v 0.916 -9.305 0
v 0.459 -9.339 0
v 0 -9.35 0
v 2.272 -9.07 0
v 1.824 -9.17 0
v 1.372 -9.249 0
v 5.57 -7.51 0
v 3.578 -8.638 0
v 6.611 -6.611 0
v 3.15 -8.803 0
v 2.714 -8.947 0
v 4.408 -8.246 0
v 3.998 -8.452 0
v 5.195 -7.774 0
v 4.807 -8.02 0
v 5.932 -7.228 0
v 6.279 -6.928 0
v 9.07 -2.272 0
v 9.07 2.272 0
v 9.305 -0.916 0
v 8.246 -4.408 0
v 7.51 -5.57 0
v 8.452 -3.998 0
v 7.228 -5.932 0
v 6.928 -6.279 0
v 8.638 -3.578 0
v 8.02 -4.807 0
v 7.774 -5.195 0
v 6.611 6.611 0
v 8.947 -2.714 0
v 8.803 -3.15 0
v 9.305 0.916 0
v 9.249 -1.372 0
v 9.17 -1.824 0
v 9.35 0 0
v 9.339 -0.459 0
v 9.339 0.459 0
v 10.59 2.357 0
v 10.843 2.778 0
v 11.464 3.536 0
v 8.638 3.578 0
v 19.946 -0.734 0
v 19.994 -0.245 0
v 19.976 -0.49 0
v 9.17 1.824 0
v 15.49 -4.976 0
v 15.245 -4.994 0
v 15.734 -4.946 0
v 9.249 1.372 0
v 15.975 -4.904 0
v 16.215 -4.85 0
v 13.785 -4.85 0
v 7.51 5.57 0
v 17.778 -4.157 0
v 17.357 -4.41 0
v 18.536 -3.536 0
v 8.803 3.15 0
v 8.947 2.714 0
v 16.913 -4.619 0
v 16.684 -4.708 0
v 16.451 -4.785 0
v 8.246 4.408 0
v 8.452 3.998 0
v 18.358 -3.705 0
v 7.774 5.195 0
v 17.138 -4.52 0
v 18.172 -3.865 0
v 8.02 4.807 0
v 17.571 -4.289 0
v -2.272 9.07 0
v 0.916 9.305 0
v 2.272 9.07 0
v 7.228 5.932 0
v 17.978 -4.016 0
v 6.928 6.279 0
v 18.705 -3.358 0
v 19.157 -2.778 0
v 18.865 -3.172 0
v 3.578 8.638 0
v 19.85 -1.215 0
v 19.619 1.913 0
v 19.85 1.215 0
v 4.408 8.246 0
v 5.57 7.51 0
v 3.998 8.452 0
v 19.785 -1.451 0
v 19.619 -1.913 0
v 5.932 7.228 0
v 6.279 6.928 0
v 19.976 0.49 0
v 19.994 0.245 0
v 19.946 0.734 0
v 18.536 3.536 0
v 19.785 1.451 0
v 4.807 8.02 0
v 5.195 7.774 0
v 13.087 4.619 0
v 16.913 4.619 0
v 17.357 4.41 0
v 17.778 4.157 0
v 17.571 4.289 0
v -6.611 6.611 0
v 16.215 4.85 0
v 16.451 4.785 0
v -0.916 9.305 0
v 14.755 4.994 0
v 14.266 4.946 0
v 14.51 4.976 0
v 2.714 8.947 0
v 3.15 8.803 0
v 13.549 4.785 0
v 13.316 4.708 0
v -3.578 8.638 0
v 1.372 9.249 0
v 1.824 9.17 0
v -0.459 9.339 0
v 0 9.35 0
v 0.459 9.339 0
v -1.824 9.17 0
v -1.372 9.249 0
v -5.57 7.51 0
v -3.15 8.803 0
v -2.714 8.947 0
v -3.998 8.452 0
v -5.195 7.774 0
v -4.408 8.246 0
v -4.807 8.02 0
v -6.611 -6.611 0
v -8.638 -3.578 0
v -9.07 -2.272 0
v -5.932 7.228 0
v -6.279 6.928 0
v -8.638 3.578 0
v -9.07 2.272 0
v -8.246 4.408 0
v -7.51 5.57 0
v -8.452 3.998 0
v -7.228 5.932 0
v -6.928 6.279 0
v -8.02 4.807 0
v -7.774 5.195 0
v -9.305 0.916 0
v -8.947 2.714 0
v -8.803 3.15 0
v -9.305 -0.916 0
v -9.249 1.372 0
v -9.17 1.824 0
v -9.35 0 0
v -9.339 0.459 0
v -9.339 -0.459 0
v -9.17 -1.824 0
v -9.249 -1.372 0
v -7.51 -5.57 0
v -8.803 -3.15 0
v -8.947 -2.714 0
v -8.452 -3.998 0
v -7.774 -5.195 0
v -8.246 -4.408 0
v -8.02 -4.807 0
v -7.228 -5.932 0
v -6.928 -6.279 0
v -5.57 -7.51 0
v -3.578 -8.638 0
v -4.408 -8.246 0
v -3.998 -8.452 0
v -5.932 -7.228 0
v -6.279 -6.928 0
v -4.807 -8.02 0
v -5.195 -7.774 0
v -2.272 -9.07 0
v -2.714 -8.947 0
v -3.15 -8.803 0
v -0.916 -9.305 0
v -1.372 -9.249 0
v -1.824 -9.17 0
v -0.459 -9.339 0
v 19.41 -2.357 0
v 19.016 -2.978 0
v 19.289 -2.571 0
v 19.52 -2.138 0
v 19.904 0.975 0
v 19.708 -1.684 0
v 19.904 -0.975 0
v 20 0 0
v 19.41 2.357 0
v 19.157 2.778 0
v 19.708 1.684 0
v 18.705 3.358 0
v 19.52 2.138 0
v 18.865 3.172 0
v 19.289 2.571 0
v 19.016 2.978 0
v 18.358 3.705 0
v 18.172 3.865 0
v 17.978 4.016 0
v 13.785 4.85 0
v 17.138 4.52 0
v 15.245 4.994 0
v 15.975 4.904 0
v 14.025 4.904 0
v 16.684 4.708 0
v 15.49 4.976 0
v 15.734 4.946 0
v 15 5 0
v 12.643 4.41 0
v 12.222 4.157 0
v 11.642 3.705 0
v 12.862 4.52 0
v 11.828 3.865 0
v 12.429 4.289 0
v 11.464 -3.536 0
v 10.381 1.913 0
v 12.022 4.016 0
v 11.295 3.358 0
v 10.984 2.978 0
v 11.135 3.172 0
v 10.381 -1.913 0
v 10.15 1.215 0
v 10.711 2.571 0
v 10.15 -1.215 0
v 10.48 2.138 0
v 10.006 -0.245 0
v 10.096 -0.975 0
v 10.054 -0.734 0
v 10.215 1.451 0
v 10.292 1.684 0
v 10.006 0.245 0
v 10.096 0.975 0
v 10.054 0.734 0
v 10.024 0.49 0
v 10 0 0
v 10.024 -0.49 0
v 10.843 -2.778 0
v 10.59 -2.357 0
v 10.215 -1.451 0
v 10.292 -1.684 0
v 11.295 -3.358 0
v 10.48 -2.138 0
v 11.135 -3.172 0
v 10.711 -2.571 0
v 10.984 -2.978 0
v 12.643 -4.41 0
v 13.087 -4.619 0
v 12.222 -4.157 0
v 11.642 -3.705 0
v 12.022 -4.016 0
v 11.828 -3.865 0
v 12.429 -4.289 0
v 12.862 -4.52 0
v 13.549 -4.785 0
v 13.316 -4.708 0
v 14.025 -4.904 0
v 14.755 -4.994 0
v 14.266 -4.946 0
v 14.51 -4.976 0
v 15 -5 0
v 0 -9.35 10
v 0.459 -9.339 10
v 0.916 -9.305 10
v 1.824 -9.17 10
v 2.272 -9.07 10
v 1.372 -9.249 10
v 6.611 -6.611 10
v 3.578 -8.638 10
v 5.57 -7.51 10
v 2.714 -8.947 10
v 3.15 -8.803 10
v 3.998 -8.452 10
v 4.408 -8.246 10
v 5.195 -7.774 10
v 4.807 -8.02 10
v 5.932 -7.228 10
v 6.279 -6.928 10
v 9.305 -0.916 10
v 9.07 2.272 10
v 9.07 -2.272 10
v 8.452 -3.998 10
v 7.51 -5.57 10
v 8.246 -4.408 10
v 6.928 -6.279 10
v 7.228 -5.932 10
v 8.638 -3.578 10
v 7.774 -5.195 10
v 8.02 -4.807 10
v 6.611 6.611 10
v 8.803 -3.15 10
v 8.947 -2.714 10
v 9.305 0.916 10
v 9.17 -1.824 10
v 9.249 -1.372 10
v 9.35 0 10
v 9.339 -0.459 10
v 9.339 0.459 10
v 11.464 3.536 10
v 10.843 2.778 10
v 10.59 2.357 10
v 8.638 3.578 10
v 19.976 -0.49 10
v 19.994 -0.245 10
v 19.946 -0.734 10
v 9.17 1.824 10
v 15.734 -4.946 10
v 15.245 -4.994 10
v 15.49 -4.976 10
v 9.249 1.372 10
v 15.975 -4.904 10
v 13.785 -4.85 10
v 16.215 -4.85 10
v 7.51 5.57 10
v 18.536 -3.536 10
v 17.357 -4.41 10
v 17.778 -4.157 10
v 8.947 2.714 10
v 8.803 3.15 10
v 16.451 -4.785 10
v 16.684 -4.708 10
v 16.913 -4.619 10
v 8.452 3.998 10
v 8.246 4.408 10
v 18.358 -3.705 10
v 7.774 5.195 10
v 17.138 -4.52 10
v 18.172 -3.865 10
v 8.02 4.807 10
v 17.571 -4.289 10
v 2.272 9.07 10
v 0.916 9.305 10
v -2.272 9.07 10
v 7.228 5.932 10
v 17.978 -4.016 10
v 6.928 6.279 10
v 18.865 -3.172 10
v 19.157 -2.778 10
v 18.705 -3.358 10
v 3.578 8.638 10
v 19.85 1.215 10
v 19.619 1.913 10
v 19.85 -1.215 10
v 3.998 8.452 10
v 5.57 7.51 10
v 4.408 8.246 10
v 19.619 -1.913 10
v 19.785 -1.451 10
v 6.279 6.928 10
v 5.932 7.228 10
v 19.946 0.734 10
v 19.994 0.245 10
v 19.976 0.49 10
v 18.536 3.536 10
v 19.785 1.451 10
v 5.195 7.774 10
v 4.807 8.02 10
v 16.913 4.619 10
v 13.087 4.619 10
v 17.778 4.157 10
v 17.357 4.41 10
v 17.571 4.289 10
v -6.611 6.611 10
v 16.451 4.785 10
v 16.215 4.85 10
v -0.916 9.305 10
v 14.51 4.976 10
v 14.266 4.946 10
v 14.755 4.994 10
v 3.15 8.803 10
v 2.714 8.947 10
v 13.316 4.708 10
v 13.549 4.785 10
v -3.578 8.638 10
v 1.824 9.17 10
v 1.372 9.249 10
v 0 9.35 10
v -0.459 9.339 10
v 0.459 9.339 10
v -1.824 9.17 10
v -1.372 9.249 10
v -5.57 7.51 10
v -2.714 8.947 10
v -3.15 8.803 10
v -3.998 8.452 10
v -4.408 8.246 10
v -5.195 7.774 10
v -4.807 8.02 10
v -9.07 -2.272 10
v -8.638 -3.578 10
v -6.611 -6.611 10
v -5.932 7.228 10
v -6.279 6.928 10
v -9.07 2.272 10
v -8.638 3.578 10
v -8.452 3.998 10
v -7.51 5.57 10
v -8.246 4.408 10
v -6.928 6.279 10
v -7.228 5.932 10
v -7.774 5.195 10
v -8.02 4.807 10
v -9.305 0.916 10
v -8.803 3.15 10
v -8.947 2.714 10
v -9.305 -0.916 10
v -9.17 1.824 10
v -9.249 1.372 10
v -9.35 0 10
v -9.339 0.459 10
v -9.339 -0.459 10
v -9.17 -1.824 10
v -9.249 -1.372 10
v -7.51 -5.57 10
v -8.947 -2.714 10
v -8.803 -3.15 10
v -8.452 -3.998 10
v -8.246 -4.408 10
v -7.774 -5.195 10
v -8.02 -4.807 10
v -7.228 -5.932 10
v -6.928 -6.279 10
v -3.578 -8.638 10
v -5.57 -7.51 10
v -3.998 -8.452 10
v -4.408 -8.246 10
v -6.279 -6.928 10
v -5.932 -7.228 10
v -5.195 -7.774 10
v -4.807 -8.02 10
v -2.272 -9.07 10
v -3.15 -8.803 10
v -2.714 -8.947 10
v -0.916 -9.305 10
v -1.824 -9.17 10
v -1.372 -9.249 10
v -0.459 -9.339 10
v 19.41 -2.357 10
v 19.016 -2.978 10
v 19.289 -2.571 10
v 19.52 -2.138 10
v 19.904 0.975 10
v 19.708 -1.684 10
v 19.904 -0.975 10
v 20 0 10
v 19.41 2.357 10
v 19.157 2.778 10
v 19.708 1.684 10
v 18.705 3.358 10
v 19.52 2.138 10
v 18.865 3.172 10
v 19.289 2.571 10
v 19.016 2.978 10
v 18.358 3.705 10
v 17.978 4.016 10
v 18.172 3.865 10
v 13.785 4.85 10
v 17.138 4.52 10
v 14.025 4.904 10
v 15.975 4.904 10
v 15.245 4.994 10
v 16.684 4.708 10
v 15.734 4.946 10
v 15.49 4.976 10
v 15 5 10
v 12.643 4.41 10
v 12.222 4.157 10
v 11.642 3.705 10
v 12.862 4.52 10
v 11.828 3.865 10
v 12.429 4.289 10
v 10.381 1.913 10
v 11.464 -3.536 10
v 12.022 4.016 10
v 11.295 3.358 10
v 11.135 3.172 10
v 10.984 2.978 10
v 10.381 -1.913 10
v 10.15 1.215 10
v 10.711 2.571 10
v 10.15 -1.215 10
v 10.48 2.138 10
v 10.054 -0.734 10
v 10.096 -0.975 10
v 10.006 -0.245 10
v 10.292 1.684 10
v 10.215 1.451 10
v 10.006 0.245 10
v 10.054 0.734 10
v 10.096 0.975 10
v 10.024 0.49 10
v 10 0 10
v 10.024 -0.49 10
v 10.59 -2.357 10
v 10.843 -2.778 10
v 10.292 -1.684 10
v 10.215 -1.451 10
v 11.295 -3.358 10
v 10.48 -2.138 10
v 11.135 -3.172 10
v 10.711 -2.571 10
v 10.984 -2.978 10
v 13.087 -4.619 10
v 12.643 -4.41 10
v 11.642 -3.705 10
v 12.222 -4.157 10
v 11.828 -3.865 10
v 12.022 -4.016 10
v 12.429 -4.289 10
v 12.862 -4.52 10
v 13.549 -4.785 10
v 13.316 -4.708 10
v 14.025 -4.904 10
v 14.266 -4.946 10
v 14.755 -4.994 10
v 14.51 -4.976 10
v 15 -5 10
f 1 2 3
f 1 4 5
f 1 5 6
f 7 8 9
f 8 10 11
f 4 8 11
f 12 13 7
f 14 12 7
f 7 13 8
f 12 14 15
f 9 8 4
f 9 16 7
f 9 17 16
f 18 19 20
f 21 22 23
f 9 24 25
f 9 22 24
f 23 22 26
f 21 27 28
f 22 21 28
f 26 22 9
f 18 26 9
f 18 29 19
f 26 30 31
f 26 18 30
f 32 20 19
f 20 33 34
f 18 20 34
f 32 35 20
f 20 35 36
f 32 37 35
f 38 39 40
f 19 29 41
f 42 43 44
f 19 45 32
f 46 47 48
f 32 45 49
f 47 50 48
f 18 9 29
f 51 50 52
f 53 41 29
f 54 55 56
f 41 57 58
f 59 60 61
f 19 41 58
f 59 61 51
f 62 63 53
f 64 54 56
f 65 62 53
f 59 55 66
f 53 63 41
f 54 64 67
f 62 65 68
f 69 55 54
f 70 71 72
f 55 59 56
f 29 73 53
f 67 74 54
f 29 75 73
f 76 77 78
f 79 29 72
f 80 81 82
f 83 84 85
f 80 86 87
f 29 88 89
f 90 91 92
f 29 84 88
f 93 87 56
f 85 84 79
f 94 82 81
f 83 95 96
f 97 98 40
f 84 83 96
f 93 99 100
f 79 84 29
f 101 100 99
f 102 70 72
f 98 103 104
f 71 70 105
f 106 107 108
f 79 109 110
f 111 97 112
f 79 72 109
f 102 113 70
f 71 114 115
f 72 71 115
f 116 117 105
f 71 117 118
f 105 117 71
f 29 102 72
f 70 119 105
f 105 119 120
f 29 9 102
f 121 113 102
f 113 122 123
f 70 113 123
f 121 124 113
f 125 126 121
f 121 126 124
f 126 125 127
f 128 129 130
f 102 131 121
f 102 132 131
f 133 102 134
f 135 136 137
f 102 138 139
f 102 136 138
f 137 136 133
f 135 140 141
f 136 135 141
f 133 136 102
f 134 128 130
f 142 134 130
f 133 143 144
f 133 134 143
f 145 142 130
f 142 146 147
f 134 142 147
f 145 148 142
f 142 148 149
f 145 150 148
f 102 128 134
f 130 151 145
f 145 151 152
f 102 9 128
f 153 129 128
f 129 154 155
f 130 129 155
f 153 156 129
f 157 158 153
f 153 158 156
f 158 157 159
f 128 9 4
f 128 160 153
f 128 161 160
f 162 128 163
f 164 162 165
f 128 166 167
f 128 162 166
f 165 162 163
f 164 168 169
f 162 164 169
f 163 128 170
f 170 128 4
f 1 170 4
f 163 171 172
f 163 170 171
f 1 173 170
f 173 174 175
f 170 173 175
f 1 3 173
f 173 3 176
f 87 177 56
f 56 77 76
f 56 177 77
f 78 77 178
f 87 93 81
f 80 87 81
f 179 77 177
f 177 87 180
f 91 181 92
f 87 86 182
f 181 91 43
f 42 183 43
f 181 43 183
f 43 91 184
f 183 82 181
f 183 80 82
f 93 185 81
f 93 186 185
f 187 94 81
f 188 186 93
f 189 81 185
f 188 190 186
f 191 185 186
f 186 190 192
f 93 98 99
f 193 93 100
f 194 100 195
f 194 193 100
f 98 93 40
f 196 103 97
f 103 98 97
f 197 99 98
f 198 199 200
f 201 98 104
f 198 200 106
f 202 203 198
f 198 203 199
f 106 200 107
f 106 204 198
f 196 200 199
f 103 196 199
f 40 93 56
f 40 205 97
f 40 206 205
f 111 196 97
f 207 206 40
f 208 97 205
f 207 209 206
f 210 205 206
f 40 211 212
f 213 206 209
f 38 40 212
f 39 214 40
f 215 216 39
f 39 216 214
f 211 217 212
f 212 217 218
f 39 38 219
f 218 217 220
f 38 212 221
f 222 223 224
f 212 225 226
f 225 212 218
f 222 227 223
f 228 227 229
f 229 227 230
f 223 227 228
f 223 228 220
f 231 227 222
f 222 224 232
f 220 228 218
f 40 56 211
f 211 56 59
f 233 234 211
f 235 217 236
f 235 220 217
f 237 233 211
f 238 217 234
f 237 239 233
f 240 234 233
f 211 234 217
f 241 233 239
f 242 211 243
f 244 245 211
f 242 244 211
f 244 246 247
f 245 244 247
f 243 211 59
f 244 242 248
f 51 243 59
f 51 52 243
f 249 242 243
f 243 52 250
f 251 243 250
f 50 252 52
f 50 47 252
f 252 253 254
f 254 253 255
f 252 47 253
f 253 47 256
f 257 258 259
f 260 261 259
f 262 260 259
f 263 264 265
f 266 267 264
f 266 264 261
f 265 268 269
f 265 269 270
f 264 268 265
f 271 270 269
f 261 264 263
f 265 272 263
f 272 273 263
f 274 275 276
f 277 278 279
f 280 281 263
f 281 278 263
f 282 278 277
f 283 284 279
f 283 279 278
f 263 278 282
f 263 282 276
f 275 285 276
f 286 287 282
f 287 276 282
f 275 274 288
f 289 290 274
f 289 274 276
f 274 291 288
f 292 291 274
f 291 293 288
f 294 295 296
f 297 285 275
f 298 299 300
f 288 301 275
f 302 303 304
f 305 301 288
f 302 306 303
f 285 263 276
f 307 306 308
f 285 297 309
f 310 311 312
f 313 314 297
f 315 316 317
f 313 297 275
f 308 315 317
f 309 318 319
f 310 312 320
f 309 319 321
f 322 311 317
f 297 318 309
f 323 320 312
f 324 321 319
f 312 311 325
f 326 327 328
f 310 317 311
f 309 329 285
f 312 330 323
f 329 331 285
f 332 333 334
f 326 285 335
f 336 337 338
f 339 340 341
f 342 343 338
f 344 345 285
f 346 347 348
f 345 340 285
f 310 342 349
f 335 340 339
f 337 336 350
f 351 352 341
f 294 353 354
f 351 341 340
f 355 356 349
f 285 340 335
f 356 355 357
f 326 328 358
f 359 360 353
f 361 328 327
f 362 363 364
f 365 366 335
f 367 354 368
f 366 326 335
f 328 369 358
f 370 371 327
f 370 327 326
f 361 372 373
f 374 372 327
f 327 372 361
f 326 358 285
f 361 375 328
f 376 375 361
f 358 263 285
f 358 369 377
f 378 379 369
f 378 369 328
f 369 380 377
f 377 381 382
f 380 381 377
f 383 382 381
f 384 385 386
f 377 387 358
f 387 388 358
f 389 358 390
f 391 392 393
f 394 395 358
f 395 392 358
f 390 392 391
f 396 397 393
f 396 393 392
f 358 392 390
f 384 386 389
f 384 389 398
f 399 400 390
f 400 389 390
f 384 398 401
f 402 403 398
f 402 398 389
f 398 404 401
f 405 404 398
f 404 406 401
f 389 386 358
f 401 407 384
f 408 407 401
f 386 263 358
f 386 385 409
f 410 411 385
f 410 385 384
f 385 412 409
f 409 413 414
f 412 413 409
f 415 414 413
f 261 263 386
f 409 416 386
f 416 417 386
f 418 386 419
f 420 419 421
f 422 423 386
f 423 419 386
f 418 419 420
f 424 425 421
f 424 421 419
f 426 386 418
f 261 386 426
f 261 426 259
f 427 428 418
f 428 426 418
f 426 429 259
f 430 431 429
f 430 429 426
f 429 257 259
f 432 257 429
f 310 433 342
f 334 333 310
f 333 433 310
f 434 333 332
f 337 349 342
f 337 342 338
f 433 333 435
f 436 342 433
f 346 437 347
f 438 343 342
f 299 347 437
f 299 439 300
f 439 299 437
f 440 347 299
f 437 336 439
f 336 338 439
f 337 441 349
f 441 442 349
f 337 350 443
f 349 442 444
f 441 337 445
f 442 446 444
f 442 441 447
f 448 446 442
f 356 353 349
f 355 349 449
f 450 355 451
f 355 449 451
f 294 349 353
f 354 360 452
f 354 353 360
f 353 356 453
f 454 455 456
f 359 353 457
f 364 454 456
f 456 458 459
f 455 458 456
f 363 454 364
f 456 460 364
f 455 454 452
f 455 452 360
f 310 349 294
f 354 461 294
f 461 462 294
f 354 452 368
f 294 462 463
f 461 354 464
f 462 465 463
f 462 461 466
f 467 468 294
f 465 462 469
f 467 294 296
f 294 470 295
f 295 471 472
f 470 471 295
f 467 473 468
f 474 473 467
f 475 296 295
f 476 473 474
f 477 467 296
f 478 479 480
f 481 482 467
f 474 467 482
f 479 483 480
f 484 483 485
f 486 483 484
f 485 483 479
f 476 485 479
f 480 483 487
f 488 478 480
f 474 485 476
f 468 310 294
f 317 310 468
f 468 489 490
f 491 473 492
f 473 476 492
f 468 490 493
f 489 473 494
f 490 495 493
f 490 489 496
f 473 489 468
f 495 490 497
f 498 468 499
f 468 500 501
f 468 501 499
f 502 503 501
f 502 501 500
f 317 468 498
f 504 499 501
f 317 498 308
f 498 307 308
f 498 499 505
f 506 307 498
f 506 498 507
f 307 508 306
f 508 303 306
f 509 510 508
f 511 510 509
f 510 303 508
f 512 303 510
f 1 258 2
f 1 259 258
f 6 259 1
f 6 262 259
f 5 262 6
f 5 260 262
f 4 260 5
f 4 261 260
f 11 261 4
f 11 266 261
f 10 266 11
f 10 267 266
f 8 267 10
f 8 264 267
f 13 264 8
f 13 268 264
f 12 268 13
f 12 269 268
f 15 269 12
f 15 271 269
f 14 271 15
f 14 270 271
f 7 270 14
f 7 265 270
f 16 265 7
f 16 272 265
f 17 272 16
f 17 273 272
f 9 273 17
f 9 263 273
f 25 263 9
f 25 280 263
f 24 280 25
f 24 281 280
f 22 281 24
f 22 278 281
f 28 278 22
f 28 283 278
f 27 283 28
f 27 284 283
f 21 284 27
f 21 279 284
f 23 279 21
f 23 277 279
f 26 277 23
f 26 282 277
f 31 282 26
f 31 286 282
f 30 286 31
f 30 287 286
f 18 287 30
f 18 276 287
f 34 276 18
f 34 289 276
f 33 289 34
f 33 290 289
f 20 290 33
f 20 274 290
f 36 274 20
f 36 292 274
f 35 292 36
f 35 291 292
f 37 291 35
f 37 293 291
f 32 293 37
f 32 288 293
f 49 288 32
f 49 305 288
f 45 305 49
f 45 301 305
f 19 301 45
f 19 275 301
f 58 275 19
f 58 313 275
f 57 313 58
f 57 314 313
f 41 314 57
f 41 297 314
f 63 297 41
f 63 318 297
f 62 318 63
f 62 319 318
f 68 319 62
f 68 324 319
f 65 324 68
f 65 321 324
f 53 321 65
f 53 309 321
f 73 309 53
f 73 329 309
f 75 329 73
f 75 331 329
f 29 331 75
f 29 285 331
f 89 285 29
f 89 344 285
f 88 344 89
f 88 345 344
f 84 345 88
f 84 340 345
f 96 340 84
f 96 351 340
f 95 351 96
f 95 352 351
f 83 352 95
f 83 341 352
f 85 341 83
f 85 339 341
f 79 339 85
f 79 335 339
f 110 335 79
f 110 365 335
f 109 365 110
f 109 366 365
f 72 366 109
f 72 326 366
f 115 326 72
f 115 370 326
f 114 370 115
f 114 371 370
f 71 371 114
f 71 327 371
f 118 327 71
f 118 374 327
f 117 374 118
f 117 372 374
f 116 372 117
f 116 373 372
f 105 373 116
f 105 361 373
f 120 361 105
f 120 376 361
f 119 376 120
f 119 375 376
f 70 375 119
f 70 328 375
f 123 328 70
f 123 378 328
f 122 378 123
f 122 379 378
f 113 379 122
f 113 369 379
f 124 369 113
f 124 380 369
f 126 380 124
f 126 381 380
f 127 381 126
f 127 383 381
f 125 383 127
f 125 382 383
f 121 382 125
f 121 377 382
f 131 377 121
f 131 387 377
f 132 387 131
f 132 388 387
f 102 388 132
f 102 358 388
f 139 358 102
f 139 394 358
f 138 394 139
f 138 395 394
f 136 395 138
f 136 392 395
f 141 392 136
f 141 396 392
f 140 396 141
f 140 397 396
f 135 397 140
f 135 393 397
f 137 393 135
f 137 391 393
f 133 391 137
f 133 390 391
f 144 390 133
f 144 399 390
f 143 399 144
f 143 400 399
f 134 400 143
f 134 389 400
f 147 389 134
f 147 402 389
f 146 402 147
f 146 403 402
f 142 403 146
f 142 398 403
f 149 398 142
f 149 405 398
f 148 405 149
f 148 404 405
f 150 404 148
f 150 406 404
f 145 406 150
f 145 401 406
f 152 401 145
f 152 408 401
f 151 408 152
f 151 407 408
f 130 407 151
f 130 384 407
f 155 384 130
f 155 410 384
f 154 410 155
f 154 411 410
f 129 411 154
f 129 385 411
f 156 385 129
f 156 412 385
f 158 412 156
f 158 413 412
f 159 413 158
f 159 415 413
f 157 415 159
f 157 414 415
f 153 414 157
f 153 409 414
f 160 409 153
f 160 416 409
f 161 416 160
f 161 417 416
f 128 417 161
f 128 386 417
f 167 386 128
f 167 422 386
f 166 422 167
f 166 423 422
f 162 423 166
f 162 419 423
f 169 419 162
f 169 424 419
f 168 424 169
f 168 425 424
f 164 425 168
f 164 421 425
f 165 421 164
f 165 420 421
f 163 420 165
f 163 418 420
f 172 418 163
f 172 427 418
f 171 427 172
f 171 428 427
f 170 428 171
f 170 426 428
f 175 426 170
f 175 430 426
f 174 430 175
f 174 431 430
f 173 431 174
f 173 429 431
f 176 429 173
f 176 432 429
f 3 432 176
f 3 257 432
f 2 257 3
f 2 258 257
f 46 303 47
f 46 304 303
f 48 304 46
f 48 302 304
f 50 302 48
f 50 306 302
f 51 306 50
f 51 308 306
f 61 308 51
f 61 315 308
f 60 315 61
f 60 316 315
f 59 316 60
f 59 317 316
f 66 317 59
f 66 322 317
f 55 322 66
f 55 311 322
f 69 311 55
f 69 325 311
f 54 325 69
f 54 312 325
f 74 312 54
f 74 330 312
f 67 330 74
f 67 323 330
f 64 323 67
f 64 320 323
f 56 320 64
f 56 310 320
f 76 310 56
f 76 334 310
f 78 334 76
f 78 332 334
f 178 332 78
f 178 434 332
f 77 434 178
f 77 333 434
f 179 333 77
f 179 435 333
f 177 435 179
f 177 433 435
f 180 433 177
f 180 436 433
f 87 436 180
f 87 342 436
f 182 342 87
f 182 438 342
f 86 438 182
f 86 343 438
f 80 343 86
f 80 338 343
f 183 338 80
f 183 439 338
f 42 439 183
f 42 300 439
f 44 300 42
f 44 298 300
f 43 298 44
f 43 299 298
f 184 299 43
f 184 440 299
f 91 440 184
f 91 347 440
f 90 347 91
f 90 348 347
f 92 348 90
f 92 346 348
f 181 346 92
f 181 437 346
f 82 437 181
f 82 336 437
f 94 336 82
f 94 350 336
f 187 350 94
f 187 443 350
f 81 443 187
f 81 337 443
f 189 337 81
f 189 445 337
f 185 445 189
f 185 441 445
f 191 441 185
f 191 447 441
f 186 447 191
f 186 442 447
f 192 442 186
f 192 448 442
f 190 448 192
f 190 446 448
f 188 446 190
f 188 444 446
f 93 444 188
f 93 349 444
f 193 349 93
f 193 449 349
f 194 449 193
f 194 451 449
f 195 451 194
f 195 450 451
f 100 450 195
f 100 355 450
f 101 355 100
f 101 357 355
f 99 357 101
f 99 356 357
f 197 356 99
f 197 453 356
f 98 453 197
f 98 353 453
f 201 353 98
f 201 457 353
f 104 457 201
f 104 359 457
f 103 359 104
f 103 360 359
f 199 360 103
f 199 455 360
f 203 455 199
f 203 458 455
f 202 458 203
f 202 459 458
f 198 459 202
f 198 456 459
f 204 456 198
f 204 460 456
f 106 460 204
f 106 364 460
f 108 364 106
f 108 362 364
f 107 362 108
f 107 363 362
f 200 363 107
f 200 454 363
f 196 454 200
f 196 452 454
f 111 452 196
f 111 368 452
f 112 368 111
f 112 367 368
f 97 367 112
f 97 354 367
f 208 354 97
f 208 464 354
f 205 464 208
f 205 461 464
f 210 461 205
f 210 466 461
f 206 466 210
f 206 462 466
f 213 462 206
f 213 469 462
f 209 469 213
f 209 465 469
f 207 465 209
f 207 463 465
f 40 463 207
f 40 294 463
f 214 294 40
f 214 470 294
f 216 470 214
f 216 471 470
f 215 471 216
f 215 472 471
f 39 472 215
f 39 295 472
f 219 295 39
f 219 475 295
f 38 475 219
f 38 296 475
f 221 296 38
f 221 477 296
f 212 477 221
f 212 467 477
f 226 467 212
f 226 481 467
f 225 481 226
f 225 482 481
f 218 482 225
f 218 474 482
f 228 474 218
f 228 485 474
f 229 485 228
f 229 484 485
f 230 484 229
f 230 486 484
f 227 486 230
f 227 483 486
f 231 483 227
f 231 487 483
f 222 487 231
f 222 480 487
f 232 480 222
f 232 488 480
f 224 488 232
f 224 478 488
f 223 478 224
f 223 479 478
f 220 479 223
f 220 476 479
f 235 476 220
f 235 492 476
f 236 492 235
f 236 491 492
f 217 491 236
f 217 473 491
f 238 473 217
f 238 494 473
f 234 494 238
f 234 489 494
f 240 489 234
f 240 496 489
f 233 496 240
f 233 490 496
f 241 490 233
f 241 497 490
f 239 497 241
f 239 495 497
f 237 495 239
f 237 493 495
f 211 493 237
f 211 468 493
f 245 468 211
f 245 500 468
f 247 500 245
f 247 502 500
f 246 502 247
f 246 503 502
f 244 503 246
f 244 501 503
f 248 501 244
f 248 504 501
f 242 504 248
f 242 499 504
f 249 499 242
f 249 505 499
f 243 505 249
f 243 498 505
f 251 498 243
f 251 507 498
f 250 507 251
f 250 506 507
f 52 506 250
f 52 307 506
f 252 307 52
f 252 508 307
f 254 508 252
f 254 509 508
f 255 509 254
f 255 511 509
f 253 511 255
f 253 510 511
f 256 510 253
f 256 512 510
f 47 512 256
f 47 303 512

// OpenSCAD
// Snap-on tubing clip for a 12.7 mm (1/2 inch) lab stand rod
// Printed flat: 2-D profile in XY, extruded 10 mm in Z

// ---------------- Parameters ----------------
rod_id      = 12.7;   // rod ring inner diameter
rod_wall    = 3;      // rod ring wall thickness
rod_od      = rod_id + 2 * rod_wall; // rod ring outer diameter (18.7)
rod_opening = 10;     // rod ring opening width (along Y)

tub_id      = 6;      // tubing ring inner diameter
tub_wall    = 2;      // tubing ring wall thickness
tub_od      = tub_id + 2 * tub_wall; // tubing ring outer diameter (10)
tub_x       = 15;     // tubing ring centre X
tub_opening = 4.5;    // tubing ring opening width (along Y)

bridge_w    = 6;      // bridge width (along Y)
bridge_x1   = 8;      // bridge start X
bridge_x2   = 12;     // bridge end X

eps         = 0.5;    // cutter overshoot past faces
$fn         = 128;    // curve resolution

// ---------------- Profile ----------------
module profile() {
    union() {
        // Rod ring with -X side opening
        difference() {
            translate([0, 0]) circle(d = rod_od);
            translate([0, -eps])
                linear_extrude(height = rod_opening)
                    polygon([[-rod_id / 2 - eps, 0], [rod_id / 2 + eps, 0], [0, -eps]]);
        }

        // Tubing ring with +X side opening
        translate([tub_x, 0])
            difference() {
                circle(d = tub_od);
                translate([eps, -tub_opening / 2])
                    rotate([90, 0, 0])
                        linear_extrude(height = tub_opening)
                            polygon([[0, 0], [tub_opening / 2 + eps, 0], [0, tub_opening / 2 + eps]]);
            }

        // Solid bridge between the two rings
        translate([bridge_x1, -bridge_w / 2])
            cube([bridge_x2 - bridge_x1, bridge_w, 1]);
    }
}

// ---------------- Part ----------------
difference() {
    translate([0, 0, 0])
        linear_extrude(height = 10)
            profile();
    // No support removal needed: all cutters overshoot the top and bottom faces.
}
